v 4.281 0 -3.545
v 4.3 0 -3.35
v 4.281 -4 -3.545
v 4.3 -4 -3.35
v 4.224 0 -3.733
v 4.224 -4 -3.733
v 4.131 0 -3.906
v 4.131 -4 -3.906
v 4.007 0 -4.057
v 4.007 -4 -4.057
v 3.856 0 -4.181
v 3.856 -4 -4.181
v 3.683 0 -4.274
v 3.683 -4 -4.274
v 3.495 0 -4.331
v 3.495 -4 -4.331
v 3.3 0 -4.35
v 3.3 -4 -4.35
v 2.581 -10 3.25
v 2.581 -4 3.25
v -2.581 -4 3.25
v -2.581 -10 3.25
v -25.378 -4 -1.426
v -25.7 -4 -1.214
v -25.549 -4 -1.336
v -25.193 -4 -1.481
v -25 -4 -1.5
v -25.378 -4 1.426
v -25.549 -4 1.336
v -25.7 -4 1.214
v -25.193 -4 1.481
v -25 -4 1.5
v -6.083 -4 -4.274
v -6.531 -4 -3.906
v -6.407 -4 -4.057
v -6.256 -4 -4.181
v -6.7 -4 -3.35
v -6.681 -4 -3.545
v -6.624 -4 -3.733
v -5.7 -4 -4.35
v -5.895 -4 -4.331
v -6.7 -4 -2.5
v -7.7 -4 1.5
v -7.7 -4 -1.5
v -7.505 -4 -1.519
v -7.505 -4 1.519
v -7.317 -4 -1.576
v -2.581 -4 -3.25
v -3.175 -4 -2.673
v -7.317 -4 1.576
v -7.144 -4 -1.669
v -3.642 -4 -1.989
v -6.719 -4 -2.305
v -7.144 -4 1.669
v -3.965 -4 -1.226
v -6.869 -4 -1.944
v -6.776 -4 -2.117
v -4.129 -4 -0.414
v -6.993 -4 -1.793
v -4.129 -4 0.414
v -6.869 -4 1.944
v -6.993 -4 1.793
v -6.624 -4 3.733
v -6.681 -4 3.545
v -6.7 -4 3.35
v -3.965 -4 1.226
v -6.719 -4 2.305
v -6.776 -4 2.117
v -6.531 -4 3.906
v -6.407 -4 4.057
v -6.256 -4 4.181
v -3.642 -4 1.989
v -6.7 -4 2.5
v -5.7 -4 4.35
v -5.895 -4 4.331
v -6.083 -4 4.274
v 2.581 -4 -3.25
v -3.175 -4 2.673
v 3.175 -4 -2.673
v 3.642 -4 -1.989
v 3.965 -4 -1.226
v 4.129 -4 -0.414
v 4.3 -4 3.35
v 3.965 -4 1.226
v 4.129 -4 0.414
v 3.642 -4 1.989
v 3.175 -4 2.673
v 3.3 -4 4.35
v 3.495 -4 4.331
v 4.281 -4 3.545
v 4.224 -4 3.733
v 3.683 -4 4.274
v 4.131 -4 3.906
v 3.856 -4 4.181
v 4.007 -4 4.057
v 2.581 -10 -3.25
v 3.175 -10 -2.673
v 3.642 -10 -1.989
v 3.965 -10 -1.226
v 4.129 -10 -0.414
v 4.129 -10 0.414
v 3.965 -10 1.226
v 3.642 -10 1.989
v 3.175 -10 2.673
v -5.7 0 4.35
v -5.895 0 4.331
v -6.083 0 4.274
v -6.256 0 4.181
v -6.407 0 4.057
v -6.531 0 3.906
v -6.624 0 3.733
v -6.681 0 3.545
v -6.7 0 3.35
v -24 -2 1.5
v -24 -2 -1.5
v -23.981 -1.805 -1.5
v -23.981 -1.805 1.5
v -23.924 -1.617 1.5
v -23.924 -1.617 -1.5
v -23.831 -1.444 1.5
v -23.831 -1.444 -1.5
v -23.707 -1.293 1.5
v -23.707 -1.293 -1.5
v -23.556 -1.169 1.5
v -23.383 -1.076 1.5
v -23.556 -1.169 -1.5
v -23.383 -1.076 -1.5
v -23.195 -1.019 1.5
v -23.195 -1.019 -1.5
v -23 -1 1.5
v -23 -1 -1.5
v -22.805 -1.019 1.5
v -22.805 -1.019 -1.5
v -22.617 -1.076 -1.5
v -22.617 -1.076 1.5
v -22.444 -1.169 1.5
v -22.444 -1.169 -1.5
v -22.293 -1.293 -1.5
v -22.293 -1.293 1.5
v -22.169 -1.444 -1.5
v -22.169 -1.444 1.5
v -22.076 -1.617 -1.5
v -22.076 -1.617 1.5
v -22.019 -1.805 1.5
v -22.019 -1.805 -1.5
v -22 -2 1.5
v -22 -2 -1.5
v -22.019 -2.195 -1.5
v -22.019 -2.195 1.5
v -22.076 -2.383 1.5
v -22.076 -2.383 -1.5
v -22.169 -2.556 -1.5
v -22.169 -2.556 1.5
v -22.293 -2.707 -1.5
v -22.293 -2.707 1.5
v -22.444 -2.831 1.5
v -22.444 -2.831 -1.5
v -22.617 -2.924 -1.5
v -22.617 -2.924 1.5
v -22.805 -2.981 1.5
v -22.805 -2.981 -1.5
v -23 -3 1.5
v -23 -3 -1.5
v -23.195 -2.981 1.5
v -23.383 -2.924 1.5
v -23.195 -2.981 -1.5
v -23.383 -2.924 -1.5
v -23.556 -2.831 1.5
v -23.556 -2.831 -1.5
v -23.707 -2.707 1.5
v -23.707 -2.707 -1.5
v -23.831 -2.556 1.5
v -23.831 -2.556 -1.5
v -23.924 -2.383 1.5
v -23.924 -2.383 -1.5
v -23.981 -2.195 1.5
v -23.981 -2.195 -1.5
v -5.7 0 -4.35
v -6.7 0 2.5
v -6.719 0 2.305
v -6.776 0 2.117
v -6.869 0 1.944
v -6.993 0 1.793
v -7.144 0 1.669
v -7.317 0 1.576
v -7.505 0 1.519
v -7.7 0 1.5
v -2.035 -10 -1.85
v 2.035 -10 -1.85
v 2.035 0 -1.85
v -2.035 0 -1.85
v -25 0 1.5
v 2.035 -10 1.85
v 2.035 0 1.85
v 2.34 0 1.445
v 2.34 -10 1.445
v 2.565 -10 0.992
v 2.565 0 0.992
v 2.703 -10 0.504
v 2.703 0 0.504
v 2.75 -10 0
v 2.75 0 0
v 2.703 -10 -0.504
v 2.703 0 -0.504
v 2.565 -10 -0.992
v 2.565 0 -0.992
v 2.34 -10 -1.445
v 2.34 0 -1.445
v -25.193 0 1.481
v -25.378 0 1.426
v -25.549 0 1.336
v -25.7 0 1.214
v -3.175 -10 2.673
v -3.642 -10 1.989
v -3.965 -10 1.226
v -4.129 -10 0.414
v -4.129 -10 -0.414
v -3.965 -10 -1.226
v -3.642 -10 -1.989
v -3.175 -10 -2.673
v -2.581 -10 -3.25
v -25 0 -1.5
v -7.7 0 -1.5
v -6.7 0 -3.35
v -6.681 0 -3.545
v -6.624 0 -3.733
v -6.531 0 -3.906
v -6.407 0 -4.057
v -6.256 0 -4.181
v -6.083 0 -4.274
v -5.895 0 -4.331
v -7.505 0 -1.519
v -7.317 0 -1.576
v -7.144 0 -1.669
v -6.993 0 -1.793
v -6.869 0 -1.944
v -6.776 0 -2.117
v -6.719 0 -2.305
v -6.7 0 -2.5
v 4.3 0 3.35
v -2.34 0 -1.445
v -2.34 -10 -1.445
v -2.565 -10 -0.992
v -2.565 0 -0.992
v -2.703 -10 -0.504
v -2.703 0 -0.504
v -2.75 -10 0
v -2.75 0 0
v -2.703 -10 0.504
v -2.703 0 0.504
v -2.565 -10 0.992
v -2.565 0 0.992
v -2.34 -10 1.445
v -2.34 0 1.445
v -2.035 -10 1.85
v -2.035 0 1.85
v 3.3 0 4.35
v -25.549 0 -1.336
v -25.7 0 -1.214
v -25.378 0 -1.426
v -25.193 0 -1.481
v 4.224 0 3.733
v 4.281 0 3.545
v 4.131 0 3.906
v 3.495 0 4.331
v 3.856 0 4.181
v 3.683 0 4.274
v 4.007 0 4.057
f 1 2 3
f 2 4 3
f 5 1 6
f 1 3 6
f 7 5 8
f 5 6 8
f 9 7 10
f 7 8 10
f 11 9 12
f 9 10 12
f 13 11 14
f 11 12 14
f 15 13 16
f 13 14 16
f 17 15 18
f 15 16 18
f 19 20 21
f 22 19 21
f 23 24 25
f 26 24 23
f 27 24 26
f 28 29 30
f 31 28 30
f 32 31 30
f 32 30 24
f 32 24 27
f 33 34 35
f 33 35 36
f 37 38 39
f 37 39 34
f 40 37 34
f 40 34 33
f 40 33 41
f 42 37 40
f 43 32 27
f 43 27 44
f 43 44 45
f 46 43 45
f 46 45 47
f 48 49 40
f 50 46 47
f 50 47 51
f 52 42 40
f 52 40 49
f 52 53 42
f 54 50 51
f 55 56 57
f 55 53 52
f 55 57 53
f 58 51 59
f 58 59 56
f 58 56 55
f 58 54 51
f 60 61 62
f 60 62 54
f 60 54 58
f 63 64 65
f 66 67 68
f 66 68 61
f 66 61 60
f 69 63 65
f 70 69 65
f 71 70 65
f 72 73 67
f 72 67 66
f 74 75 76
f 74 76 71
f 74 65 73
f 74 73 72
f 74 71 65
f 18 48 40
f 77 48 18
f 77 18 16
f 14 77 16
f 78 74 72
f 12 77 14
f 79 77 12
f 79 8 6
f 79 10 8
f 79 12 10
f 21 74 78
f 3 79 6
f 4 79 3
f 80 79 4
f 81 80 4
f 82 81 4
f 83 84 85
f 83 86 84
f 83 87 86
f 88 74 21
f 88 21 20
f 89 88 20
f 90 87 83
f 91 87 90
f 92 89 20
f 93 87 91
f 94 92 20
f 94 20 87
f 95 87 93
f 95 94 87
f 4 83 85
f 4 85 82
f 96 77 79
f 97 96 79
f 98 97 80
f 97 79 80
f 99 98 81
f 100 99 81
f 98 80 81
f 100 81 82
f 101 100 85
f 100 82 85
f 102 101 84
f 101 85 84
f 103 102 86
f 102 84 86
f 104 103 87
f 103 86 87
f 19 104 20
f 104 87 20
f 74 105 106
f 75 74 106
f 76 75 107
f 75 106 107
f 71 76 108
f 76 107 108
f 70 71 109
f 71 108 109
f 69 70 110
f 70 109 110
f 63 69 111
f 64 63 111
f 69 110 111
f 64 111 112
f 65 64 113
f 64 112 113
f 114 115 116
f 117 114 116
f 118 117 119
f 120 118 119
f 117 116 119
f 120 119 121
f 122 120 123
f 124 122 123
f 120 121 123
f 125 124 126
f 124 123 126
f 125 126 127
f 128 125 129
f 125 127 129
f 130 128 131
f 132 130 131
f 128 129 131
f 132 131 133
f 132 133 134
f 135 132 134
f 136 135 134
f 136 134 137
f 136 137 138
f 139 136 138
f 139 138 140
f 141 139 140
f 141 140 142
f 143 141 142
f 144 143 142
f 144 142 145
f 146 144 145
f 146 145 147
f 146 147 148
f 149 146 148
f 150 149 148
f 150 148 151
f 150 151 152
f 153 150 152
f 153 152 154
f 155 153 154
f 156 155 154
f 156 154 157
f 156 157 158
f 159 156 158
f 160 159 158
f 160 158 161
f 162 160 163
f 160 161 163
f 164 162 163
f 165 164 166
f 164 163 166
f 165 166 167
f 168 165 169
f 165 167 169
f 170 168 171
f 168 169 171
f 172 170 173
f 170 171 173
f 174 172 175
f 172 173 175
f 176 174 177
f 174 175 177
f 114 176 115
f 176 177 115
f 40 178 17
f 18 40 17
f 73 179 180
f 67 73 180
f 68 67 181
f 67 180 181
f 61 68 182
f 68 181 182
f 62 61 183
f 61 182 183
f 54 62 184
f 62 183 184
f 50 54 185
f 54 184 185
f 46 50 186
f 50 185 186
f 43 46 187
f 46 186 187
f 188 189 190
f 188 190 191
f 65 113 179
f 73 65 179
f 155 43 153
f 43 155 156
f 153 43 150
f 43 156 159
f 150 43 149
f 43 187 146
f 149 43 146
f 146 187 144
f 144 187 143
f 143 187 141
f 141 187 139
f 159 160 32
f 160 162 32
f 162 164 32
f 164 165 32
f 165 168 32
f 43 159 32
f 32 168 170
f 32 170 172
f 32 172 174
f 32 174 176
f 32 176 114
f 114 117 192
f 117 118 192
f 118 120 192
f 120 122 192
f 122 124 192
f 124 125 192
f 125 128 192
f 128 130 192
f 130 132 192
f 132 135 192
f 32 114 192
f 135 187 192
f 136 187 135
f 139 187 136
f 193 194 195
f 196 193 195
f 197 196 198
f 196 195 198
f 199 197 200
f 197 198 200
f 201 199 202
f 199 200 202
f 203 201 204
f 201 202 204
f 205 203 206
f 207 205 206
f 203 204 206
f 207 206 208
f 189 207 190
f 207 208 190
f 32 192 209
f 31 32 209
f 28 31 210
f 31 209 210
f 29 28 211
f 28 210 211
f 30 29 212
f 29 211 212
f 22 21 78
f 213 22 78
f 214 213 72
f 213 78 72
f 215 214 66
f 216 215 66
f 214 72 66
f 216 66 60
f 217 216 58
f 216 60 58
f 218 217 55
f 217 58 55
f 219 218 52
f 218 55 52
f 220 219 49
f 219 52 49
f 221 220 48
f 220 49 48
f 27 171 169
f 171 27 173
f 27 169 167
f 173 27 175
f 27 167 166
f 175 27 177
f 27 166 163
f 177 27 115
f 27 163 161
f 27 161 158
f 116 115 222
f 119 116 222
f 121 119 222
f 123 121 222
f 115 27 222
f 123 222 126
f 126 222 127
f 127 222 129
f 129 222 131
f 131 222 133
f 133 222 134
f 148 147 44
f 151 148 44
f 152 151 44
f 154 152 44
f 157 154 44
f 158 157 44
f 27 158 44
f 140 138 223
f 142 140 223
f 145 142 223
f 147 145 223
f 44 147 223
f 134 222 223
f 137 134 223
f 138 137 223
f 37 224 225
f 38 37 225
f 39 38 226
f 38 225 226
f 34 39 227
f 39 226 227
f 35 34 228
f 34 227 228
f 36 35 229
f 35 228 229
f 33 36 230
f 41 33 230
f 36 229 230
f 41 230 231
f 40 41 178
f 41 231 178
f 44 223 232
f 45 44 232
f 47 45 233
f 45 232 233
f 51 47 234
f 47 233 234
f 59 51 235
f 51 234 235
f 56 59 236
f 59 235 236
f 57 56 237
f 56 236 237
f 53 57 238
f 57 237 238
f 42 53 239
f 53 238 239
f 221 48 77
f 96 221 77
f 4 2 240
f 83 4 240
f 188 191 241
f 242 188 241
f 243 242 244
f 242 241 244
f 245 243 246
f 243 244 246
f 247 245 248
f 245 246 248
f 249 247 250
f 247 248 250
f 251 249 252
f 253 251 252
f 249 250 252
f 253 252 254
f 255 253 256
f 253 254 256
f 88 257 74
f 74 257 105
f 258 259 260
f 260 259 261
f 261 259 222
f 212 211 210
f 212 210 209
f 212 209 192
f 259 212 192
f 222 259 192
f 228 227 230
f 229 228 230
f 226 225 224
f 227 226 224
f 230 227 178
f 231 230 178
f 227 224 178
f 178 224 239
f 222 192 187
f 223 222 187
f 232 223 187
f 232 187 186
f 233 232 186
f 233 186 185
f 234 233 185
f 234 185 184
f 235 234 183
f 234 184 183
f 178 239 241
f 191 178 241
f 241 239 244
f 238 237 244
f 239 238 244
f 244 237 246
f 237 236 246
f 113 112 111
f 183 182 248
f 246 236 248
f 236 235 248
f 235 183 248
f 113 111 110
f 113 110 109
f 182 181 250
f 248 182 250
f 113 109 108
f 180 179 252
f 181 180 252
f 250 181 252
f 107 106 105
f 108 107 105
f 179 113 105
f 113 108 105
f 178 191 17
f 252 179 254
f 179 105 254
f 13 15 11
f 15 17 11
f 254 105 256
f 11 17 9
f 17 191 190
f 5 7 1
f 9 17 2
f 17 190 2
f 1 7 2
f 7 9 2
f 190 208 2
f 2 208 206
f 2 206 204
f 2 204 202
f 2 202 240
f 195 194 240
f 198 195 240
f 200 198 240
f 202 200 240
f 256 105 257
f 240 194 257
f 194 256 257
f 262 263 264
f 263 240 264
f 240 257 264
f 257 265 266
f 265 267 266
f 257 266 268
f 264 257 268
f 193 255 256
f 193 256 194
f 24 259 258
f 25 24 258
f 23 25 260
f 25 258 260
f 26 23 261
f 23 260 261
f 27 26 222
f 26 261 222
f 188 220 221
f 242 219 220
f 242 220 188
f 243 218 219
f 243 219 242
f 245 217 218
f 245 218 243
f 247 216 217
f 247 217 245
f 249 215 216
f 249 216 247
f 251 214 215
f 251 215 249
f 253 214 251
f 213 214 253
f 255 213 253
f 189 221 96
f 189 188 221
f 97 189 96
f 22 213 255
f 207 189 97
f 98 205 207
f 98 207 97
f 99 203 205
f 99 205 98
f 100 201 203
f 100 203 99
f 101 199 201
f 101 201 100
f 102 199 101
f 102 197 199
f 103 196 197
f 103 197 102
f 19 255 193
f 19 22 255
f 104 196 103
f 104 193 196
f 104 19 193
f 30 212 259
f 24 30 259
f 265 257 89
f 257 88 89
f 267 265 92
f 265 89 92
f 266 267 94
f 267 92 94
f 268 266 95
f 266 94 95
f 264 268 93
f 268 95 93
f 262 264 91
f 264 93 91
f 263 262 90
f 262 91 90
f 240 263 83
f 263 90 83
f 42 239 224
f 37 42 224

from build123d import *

# Parameters (mm, degrees)
F1_DEPTH = 4
F3_D     = 2
F4_R     = 1
F5_R     = 1
F7_DEPTH = 6


with BuildPart() as f1:
    # F0 (on Front) → F1 (new body)
    with BuildSketch(Plane.XZ):
        with BuildLine():
            Line((4.3, 0), (4.3, 4.35))
            Line((4.3, 4.35), (-5.7, 4.35))
            ThreePointArc((-5.7, 4.35), (-6.407107, 4.057107), (-6.7, 3.35))
            Line((-6.7, 3.35), (-6.7, 2.5))
            ThreePointArc((-6.7, 2.5), (-6.992893, 1.792893), (-7.7, 1.5))
            Line((-7.7, 1.5), (-25, 1.5))
            ThreePointArc((-25, 1.5), (-25.378059, 1.425782), (-25.7, 1.214143))
            Line((-25.7, 1.214143), (-25.7, -1.214143))
            ThreePointArc((-25.7, -1.214143), (-25.378059, -1.425782), (-25, -1.5))
            Line((-25, -1.5), (-7.7, -1.5))
            ThreePointArc((-7.7, -1.5), (-6.992893, -1.792893), (-6.7, -2.5))
            Line((-6.7, -2.5), (-6.7, -3.35))
            ThreePointArc((-6.7, -3.35), (-6.407107, -4.057107), (-5.7, -4.35))
            Line((-5.7, -4.35), (4.3, -4.35))
            Line((4.3, -4.35), (4.3, 0))
        make_face()
        with BuildLine():
            ThreePointArc((-2.034699, -1.85), (-2.75, 0), (-2.034699, 1.85))
            Line((-2.034699, 1.85), (2.034699, 1.85))
            ThreePointArc((2.034699, 1.85), (2.75, 0), (2.034699, -1.85))
            Line((2.034699, -1.85), (-2.034699, -1.85))
        make_face(mode=Mode.SUBTRACT)
    extrude(amount=F1_DEPTH)

    # F3 (through all)
    with Locations(Plane.XY.offset(4.35)):
        with Locations((-23, -2)):
            Hole(F3_D / 2)

    # F4
    f4_edges = [f1.edges().sort_by_distance(p)[0] for p in [
        (4.3, -2, 4.35),
    ]]
    fillet(f4_edges, radius=F4_R)

    # F5
    f5_edges = [f1.edges().sort_by_distance(p)[0] for p in [
        (4.3, -2, -4.35),
    ]]
    fillet(f5_edges, radius=F5_R)

    # F6 (on face) → F7 (join)
    with BuildSketch(Plane.XZ.offset(4)):
        with BuildLine():
            ThreePointArc((-2.580698, 3.25), (-4.15, 0), (-2.580698, -3.25))
            Line((-2.580698, -3.25), (2.580698, -3.25))
            ThreePointArc((2.580698, -3.25), (4.15, 0), (2.580698, 3.25))
            Line((2.580698, 3.25), (-2.580698, 3.25))
        make_face()
        with BuildLine():
            Line((2.034699, -1.85), (-2.034699, -1.85))
            ThreePointArc((-2.034699, -1.85), (-2.75, 0), (-2.034699, 1.85))
            Line((-2.034699, 1.85), (2.034699, 1.85))
            ThreePointArc((2.034699, 1.85), (2.75, 0), (2.034699, -1.85))
        make_face(mode=Mode.SUBTRACT)
    extrude(amount=F7_DEPTH)


solid = f1.part
